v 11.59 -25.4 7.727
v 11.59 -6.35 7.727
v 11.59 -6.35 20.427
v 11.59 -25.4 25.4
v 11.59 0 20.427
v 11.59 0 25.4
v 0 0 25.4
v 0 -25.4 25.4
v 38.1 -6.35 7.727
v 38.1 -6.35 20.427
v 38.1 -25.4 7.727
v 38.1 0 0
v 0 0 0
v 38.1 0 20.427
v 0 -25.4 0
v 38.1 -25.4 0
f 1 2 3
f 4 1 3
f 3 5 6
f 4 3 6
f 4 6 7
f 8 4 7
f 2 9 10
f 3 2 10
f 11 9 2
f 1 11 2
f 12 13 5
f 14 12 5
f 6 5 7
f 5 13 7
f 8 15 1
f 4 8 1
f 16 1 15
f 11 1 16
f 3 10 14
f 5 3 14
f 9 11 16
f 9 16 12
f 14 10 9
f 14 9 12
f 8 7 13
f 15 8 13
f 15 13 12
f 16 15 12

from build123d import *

# Parameters (mm, degrees)
F1_DEPTH = 25.4
F2_W     = 6.35
F2_H     = 12.7
F3_DEPTH = 26.509916


with BuildPart() as f1:
    # F0 (on Front) → F1 (new body)
    with BuildSketch(Plane.XZ):
        Polygon((0, 25.4), (0, 0), (38.1, 0), (38.1, 7.726722), (11.590084, 7.726722), (11.590084, 25.4), align=None)
    extrude(amount=F1_DEPTH)

    # F2 (on face) → F3 (join, through all)
    with BuildSketch(Plane.YZ.offset(11.590084)):
        with Locations((-3.175, 14.076722)):
            Rectangle(F2_W, F2_H)
    extrude(amount=F3_DEPTH)


solid = f1.part
